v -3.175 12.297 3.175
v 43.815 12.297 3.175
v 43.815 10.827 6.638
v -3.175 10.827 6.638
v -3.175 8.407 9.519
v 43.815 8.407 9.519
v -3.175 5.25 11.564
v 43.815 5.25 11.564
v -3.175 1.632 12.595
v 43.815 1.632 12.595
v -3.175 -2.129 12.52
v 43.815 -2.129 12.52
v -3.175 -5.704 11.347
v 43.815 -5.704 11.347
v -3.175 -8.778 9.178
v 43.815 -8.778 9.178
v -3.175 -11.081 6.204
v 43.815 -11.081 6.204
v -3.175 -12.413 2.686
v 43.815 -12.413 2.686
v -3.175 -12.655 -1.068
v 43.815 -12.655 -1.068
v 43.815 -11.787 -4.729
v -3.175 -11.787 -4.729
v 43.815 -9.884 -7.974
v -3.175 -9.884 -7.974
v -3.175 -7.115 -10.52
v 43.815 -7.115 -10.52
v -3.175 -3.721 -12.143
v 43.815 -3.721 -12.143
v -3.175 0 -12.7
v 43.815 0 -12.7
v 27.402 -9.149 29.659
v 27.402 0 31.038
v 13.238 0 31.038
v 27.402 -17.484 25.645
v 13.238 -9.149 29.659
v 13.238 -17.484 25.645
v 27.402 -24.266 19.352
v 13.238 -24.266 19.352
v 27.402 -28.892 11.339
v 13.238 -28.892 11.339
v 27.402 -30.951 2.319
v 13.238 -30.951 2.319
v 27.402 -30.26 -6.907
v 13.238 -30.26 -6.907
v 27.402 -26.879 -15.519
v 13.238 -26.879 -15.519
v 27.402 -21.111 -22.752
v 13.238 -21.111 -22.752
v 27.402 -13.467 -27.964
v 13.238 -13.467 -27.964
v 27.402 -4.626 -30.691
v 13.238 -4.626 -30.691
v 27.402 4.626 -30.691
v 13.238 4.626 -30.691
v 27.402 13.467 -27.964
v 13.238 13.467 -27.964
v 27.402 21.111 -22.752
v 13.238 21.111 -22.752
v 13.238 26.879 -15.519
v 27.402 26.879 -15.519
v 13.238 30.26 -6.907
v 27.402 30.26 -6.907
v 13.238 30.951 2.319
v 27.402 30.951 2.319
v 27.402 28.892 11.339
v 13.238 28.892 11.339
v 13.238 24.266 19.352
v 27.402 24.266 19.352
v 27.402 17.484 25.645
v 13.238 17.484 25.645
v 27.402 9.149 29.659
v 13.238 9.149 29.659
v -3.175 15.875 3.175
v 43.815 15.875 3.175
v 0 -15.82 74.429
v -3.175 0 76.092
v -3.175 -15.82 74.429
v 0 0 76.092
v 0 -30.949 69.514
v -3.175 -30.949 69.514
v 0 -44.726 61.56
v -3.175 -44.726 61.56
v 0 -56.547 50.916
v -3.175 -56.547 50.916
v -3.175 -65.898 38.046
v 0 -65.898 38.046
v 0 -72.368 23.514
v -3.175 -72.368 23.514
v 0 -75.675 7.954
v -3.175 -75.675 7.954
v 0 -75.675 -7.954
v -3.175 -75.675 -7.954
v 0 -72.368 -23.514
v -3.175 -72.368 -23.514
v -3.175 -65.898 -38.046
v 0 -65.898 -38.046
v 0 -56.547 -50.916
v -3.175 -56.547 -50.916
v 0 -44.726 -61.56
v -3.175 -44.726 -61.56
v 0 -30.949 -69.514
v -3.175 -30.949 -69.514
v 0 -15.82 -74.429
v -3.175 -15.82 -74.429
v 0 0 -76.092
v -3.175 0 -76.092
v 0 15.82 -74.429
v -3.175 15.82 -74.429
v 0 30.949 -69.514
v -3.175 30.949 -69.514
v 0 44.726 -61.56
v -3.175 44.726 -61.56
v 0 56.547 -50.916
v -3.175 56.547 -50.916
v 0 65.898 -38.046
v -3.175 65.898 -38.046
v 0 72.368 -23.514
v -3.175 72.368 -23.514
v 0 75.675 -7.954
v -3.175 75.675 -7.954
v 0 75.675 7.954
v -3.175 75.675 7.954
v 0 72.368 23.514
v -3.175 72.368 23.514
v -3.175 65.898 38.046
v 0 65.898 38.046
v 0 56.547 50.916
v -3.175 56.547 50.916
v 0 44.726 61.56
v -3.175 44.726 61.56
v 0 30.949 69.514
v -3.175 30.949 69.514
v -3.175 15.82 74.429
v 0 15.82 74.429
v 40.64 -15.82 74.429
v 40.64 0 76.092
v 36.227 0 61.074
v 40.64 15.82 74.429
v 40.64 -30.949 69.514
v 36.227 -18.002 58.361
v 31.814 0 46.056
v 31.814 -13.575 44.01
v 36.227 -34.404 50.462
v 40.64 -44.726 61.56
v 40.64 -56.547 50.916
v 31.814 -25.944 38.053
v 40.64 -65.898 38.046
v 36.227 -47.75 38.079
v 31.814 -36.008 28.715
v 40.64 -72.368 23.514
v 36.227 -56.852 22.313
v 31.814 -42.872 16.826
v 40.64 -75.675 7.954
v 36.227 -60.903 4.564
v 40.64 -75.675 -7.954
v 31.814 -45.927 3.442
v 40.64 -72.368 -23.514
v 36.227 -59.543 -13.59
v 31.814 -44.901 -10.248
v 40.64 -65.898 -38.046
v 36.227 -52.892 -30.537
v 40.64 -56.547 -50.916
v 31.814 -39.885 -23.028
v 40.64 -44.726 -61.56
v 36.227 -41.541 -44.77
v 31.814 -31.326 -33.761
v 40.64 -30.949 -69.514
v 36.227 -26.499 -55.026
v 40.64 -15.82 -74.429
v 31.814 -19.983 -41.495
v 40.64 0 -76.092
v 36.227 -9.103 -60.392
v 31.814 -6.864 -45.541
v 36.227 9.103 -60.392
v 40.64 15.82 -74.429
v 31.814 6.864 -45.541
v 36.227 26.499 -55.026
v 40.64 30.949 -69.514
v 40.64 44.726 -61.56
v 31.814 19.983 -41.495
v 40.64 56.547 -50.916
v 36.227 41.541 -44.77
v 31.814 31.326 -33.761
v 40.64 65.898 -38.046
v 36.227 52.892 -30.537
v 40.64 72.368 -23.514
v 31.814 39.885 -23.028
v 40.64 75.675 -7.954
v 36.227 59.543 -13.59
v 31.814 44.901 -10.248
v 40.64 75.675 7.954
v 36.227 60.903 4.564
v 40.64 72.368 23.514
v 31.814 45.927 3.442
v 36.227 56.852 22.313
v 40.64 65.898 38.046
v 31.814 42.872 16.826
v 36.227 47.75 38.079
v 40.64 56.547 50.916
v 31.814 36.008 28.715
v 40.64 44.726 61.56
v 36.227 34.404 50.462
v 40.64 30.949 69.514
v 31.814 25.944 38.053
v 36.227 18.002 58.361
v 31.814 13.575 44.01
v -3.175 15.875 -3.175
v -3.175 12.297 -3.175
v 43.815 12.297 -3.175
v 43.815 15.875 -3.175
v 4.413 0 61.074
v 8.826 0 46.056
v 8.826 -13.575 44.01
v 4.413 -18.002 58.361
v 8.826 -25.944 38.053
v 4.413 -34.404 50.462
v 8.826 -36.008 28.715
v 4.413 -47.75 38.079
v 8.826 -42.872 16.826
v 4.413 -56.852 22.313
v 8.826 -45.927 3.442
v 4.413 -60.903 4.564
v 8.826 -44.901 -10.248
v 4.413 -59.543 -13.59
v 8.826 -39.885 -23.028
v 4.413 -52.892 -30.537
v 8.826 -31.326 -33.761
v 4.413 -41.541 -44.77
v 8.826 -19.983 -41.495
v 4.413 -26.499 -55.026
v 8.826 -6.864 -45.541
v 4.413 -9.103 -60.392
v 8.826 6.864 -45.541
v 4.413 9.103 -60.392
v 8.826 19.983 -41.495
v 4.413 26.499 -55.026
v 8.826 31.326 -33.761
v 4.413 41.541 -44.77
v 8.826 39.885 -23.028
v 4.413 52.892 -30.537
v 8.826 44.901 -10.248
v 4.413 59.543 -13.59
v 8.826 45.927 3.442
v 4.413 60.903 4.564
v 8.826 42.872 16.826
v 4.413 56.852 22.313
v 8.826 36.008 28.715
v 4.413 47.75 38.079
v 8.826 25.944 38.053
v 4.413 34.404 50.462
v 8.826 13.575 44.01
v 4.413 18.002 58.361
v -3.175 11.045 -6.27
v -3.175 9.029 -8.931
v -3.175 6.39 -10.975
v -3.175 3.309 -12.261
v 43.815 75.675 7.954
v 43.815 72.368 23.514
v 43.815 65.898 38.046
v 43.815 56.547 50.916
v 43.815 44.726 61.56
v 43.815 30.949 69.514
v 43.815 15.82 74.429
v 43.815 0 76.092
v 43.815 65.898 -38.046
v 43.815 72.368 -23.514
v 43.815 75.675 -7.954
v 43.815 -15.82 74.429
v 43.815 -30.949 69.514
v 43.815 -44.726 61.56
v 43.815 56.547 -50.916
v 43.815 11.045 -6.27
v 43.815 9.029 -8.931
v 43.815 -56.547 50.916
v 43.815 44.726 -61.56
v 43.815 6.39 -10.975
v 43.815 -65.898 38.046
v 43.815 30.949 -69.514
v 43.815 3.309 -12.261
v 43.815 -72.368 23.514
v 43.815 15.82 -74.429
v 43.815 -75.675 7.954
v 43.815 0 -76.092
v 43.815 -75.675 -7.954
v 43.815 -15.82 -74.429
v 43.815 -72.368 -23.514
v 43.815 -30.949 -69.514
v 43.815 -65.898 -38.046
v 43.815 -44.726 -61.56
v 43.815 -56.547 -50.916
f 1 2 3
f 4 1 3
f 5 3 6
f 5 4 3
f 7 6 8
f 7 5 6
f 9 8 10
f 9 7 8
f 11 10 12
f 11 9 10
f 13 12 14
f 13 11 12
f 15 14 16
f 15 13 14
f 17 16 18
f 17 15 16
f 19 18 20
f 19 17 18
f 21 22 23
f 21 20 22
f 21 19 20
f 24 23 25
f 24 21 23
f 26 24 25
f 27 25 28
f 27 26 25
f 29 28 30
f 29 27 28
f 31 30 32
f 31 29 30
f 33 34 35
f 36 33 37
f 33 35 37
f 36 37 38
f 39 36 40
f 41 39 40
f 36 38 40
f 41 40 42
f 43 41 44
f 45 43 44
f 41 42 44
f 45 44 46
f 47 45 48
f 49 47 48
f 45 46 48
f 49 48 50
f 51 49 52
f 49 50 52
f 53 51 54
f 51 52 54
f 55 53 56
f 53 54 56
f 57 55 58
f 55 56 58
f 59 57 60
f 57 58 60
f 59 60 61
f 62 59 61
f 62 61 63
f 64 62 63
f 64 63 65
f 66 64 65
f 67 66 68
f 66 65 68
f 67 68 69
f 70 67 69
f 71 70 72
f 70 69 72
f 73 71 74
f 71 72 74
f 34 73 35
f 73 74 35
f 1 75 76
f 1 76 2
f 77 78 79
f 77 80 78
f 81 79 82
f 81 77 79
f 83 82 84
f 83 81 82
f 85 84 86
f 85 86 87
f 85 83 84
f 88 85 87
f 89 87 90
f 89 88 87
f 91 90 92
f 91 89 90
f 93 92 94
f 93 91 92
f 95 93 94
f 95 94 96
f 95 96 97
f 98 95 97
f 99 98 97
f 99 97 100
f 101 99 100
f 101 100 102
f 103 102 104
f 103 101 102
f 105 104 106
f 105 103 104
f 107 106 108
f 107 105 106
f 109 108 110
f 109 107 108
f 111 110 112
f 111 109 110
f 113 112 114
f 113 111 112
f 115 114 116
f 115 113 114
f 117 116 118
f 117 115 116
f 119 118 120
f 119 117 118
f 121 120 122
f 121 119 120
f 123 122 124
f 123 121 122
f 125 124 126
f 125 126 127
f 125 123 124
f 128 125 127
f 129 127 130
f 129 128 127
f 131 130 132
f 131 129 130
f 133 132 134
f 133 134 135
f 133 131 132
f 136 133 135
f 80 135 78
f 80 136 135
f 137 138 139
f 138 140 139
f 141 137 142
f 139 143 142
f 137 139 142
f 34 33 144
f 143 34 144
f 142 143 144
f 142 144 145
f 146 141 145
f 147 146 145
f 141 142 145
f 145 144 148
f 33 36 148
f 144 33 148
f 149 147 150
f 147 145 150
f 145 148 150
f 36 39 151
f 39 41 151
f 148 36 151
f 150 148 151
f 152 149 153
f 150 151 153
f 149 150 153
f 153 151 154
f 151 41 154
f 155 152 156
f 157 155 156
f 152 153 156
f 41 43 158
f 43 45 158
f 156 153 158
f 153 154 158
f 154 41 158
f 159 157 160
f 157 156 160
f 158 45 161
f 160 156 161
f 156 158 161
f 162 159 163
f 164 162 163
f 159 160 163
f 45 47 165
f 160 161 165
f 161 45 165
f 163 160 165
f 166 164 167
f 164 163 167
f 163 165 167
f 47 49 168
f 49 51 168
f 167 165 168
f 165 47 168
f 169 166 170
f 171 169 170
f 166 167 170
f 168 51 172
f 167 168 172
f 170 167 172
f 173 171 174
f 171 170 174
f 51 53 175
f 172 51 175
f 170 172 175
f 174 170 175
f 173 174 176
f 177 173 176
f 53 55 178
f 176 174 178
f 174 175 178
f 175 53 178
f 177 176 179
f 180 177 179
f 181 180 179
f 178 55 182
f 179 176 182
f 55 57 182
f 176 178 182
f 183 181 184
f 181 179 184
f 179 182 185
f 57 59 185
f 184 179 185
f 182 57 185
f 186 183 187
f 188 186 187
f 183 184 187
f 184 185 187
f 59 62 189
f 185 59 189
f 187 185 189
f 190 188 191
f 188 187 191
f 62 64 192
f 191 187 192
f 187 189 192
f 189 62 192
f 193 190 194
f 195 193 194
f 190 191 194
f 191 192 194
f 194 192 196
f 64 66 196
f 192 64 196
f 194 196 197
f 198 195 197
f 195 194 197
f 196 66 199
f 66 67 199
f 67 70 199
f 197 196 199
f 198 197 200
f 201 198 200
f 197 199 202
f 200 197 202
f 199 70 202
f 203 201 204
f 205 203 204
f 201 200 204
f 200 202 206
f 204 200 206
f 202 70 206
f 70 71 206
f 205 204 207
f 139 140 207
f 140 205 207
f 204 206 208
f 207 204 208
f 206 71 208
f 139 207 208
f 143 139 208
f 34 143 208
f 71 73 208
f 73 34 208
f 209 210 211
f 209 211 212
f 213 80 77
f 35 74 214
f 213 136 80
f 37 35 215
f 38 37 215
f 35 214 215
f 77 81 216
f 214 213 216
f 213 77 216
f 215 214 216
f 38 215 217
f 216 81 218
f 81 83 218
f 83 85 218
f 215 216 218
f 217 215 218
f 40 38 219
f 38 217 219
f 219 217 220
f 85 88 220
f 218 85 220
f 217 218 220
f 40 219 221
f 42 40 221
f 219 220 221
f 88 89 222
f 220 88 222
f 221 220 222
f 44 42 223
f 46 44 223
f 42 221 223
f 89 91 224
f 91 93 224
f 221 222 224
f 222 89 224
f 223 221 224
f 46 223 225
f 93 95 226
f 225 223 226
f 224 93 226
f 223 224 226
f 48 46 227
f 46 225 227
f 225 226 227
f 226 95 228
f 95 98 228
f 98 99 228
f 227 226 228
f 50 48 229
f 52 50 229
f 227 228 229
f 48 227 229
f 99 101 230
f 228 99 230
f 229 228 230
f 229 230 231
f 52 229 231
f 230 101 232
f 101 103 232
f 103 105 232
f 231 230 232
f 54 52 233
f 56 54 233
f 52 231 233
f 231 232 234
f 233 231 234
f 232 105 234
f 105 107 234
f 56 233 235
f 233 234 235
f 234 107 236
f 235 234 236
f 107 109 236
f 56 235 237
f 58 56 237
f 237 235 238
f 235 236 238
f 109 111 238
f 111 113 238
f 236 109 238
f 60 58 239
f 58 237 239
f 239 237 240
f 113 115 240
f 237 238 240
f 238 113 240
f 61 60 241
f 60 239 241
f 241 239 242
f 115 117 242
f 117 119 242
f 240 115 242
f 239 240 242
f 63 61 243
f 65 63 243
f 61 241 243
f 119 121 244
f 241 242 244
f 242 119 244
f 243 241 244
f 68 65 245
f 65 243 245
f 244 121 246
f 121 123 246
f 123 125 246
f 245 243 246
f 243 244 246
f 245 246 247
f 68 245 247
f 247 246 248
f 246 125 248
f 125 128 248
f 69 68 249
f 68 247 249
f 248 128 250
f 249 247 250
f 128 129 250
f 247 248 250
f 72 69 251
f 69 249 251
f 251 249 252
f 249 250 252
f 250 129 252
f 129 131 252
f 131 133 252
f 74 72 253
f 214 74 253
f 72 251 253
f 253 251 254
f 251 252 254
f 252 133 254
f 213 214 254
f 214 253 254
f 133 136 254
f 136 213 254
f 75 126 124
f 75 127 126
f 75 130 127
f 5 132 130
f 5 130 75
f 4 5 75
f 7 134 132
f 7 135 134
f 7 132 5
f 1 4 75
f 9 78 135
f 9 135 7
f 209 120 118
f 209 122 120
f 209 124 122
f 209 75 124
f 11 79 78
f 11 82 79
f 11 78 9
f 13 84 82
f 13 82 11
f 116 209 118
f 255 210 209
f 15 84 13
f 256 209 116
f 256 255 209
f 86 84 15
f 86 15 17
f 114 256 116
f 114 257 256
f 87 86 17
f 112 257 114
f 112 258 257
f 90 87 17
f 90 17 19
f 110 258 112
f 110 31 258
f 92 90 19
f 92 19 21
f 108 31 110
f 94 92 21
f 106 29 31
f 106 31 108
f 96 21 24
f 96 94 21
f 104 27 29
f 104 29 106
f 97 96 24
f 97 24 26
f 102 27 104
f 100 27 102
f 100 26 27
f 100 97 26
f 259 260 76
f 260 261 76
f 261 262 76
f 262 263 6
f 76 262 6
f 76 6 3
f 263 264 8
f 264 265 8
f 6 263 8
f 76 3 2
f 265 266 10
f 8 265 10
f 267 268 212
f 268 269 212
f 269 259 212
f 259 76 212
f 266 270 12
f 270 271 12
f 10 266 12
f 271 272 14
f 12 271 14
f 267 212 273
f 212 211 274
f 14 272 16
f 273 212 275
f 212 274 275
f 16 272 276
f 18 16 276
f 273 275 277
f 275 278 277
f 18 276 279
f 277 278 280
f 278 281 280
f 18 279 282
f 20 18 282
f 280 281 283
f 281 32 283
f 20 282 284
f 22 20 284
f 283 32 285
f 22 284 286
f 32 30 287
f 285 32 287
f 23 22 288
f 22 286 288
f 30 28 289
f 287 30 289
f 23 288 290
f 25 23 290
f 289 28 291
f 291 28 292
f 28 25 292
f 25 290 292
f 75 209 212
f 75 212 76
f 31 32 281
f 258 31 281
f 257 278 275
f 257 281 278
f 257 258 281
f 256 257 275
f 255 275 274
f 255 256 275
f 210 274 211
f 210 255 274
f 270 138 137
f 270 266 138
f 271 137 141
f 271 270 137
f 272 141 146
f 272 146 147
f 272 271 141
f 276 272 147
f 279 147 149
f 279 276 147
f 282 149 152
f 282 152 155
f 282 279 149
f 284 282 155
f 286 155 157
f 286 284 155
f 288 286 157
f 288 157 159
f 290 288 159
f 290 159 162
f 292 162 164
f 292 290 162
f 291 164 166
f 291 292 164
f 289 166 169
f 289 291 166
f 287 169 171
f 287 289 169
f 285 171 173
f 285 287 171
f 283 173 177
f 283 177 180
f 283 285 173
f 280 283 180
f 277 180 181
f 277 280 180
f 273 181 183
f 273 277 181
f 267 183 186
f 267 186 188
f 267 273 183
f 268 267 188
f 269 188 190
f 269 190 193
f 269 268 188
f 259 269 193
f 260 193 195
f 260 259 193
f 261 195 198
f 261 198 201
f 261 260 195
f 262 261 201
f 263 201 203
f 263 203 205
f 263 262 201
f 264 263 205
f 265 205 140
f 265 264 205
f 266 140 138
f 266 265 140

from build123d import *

# Parameters (mm, degrees)
SKETCH1_W               = 3.175
SKETCH1_H               = 69.74205
CUT_EXTRUDE1_DEPTH      = 25.146
CUT_EXTRUDE1_DEPTH_BACK = 108.204
SKETCH2_R               = 6.35


with BuildPart() as part:
    # Sketch1 → Revolve1 (revolve)
    with BuildSketch(Plane.XY, mode=Mode.PRIVATE) as revolve1_sk:
        Polygon((13.238453462, 31.037681507), (0, 76.09205), (0, 6.35), (22.013333333, 6.35), (40.64, 6.35), (40.64, 76.09205), (27.401546538, 31.037681507), align=None)
        with Locations((-1.5875, 41.221025)):
            Rectangle(SKETCH1_W, SKETCH1_H)
        with Locations((42.2275, 41.221025)):
            Rectangle(SKETCH1_W, SKETCH1_H)
    revolve(revolve1_sk.sketch.rotate(Axis((0, 0, 0), (1, 0, 0)), 90), axis=Axis((0, 0, 0), (1, 0, 0)))

    # Sketch2 → Cut-Extrude1 (cut, two sides: drawn at the far end of the back side and taken through both)
    # profile 1 of 4: a face of its own
    with BuildSketch(Plane(origin=(43.815, 0, 0), x_dir=(0, 0, -1), z_dir=(1, 0, 0)).offset(-CUT_EXTRUDE1_DEPTH_BACK)):
        with BuildLine():
            Line((3.175, 12.296722124), (3.175, 9.525))
            Line((3.175, 9.525), (-3.175, 9.525))
            Line((-3.175, 9.525), (-3.175, 12.296722124))
            ThreePointArc((-3.175, 12.296722124), (-7.777129933, -10.040231571), (12.7, 0))
            ThreePointArc((12.7, 0), (10.040231571, 7.777129933), (3.175, 12.296722124))
        make_face()
        Circle(SKETCH2_R, mode=Mode.SUBTRACT)
    # profile 2 of 4: a face of its own
    with BuildSketch(Plane(origin=(43.815, 0, 0), x_dir=(0, 0, -1), z_dir=(1, 0, 0)).offset(-CUT_EXTRUDE1_DEPTH_BACK)):
        with BuildLine():
            Line((-3.175, 9.525), (3.175, 9.525))
            Line((3.175, 9.525), (3.175, 12.296722124))
            ThreePointArc((3.175, 12.296722124), (0, 12.7), (-3.175, 12.296722124))
            Line((-3.175, 12.296722124), (-3.175, 9.525))
        make_face()
    # profile 3 of 4: a face of its own
    with BuildSketch(Plane(origin=(43.815, 0, 0), x_dir=(0, 0, -1), z_dir=(1, 0, 0)).offset(-CUT_EXTRUDE1_DEPTH_BACK)):
        with BuildLine():
            ThreePointArc((-3.175, 12.296722124), (0, 12.7), (3.175, 12.296722124))
            Line((3.175, 12.296722124), (3.175, 15.875))
            Line((3.175, 15.875), (-3.175, 15.875))
            Line((-3.175, 15.875), (-3.175, 12.296722124))
        make_face()
    # profile 4 of 4: a face of its own
    with BuildSketch(Plane(origin=(43.815, 0, 0), x_dir=(0, 0, -1), z_dir=(1, 0, 0)).offset(-CUT_EXTRUDE1_DEPTH_BACK)):
        with BuildLine():
            Line((-3.175, 9.525), (3.175, 9.525))
            Line((3.175, 9.525), (3.175, 12.296722124))
            ThreePointArc((3.175, 12.296722124), (0, 12.7), (-3.175, 12.296722124))
            Line((-3.175, 12.296722124), (-3.175, 9.525))
        make_face()
    extrude(amount=CUT_EXTRUDE1_DEPTH + CUT_EXTRUDE1_DEPTH_BACK, mode=Mode.SUBTRACT)


solid = part.part
